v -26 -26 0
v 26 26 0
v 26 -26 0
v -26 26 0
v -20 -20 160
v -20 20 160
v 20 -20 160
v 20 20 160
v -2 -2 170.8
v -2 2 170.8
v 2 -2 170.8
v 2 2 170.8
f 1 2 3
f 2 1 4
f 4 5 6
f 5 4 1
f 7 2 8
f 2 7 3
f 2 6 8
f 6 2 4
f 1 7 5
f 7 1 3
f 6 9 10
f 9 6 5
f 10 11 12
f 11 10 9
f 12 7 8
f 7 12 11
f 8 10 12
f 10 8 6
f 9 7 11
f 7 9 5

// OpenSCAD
// file: tower.scad
// ======================================================
// Dice Tower (tapered shell) + DIAGONAL baffles (wall-to-wall)
// Baffles tilt across X (rotate about Y) and alternate each level
// ======================================================
$fn = 64;

// ---------- Tower geometry ----------
tower_h       = 160;   // body height (not counting cap)
outer_w_bot   = 52;    // outer width at base
outer_w_top   = 40;    // outer width at top
wall          = 3;     // wall thickness
cap_h         = 18;    // little pyramid cap

// Inner chute (constant rectangle, centered)
chute_w       = 32;    // X (give chunky d20s room)
chute_d       = 32;    // Y

// Exit opening (front = +Y)
base_clear_h  = 22;
exit_w        = 34;
exit_h        = 20;

// Funnel at top
funnel_h      = 20;
funnel_over   = 3;

// ---------- Baffles (DIAGONAL across X) ----------
num_baffles       = 6;
baffle_t          = 3.0;   // slightly thicker for robustness
baffle_angle_deg  = 15;     // slope across X (left high → right low, then flip)
baffle_margin     = 10;     // top/bottom margin before first/after last
y_clear_from_wall = 1.5;    // clearance from front/back walls (Y)
 x_overlap         = 1.0;    // small penetration into wall to avoid boolean slivers
baffle_max_width  = 18;     // max baffle width to prevent jamming

// ---------- helpers ----------
module taper(wb, wt, h){ linear_extrude(h, scale=wt/wb) square([wb,wb], center=true); }
function iw_bot() = outer_w_bot - 2*wall;
function iw_top() = outer_w_top - 2*wall;
function inner_w_at_z(z) = iw_bot() + (iw_top() - iw_bot()) * (z / tower_h);

// ---------- outer shell ----------
module outer_shell(){
  union(){
    taper(outer_w_bot, outer_w_top, tower_h);
    // Replace polyhedron cap with a short flat-ish cap to avoid fragile apex
    translate([0,0,tower_h])
      taper(outer_w_top, 4.0, cap_h*0.6); // small flat cap rather than a sharp point
  }
}

// ---------- subtractions ----------
module inner_cavity_taper(){ taper(iw_bot(), iw_top(), tower_h); }
module main_chute(){ linear_extrude(tower_h) square([chute_w, chute_d], center=true); }
module exit_window(){
  translate([0,0,base_clear_h + exit_h/2])
    rotate([90,0,0]) cube([exit_w, wall*2+0.2, exit_h], center=true);
}
module top_funnel(){
  fw_top = chute_w + 2*funnel_over;
  fw_bot = iw_top() - 2;
  fh     = min(funnel_h, tower_h*0.35);
  translate([0,0,tower_h - fh]) taper(fw_bot, fw_top, fh);
}

// ---------- DIAGONAL baffles (tilt across X, alternate) ----------
module baffles_diagonal(){
  usable_h = (tower_h - base_clear_h) - 2*baffle_margin;
  spacing  = usable_h / max(num_baffles,1);

  // size in Y (front/back) – centered with a small gap to both walls
  len_y = chute_d - 2*y_clear_from_wall;

  for(i=[0:num_baffles-1]){
    zc   = base_clear_h + baffle_margin + spacing*(i+0.5);
    iw_z = inner_w_at_z(zc);             // inner width between side walls at this Z

    // PROPER FIX: Baffles must attach to walls to be printable
    // Alternate between left-wall and right-wall attachment
    // Each baffle spans from one wall partway across, leaving flow gap on opposite side
    
    // Safety clamp: ensure flow gap is large enough for common D20s.
    // gap = chute_w - len_x  => enforce gap >= safe_d20 + clearance
    safe_d20   = 22.5;    // typical tip-to-tip diagonal for D20 (mm)
    clearance  = 0.5;     // extra wiggle room (mm)
  // maximum allowed baffle length so the remaining gap fits a D20
  max_len_allowed = max([0, chute_w - (safe_d20 + clearance)]);

  // clamp also by the local inner width at this Z to avoid overhanging into the tapered shell
  // leave a small margin so baffles don't butt exactly at the wall edge
  small_margin = 2.0;
  cap_by_inner = max([0, iw_z - small_margin]);

  // final baffle length: pick the desired coverage, clamp by D20, max width, and inner width;
  // ensure a tiny positive minimum so cube() never gets a zero size
  len_x = max([0.1, min([chute_w * 0.4, max_len_allowed, baffle_max_width, cap_by_inner])]);

    // Add a tiny positive overlap into the wall to avoid boolean slivers (use x_overlap if set)
    wall_penetration = max([0, x_overlap]);

    // compute x_offset so the baffle visibly attaches to the INNER wall at this Z
    inner_half = iw_z / 2;
    left_face  = -inner_half - wall_penetration; // a bit into the inner wall
    right_face =  inner_half + wall_penetration;
    x_offset = (i % 2 == 0) ?
      left_face + len_x/2 :   // Even: attach to LEFT inner wall
      right_face - len_x/2;   // Odd: attach to RIGHT inner wall

    // alternate slope across X: even -> left high/right low, odd -> reverse
    sign = (i % 2 == 0) ? 1 : -1;
    tilt = sign * baffle_angle_deg;

    // Single diagonal baffle - attached to alternating walls
    translate([x_offset, 0, zc])
      rotate([0, tilt, 0])
        cube([len_x, len_y, baffle_t], center=true);
  }
}

// ---------- assembly ----------
difference(){
  union(){
    outer_shell();
    // include internal shelves so they remain after subtraction
    baffles_diagonal();
  }
  inner_cavity_taper();
  main_chute();    // ensures a straight chute inside the tapered shell
  exit_window();
  top_funnel();
}

/* Tuning:
- Want a stronger slope?   baffle_angle_deg = 18–20
- Easier bridging?         baffle_t = 3.0
- More room for big dice?  chute_w = chute_d = 34
- Shelves touching side walls more obviously? increase x_overlap to 1.0
- If you prefer the “front/back hug” style instead, tell me and I’ll swap the
  tilt axis (rotate about X) and add the exact Y wall gap computation.
*/

// ---------- test slice helper ----------
// Renders a short vertical slice of the tower (0..slice_h mm) for test-printing
module test_slice(slice_h = 50){
  // render the final assembled tower, then clip with an intersection cube
  intersection(){
    // full model
    difference(){
      union(){ outer_shell(); baffles_diagonal(); }
      inner_cavity_taper();
      main_chute();
      exit_window();
      top_funnel();
    }
    // clipping box
    translate([-100,-100,0])
      cube([200,200,slice_h], center=false);
  }
}
// main file
use <tower.scad>

// Render only the outer shell to isolate mesh issues
outer_shell();
